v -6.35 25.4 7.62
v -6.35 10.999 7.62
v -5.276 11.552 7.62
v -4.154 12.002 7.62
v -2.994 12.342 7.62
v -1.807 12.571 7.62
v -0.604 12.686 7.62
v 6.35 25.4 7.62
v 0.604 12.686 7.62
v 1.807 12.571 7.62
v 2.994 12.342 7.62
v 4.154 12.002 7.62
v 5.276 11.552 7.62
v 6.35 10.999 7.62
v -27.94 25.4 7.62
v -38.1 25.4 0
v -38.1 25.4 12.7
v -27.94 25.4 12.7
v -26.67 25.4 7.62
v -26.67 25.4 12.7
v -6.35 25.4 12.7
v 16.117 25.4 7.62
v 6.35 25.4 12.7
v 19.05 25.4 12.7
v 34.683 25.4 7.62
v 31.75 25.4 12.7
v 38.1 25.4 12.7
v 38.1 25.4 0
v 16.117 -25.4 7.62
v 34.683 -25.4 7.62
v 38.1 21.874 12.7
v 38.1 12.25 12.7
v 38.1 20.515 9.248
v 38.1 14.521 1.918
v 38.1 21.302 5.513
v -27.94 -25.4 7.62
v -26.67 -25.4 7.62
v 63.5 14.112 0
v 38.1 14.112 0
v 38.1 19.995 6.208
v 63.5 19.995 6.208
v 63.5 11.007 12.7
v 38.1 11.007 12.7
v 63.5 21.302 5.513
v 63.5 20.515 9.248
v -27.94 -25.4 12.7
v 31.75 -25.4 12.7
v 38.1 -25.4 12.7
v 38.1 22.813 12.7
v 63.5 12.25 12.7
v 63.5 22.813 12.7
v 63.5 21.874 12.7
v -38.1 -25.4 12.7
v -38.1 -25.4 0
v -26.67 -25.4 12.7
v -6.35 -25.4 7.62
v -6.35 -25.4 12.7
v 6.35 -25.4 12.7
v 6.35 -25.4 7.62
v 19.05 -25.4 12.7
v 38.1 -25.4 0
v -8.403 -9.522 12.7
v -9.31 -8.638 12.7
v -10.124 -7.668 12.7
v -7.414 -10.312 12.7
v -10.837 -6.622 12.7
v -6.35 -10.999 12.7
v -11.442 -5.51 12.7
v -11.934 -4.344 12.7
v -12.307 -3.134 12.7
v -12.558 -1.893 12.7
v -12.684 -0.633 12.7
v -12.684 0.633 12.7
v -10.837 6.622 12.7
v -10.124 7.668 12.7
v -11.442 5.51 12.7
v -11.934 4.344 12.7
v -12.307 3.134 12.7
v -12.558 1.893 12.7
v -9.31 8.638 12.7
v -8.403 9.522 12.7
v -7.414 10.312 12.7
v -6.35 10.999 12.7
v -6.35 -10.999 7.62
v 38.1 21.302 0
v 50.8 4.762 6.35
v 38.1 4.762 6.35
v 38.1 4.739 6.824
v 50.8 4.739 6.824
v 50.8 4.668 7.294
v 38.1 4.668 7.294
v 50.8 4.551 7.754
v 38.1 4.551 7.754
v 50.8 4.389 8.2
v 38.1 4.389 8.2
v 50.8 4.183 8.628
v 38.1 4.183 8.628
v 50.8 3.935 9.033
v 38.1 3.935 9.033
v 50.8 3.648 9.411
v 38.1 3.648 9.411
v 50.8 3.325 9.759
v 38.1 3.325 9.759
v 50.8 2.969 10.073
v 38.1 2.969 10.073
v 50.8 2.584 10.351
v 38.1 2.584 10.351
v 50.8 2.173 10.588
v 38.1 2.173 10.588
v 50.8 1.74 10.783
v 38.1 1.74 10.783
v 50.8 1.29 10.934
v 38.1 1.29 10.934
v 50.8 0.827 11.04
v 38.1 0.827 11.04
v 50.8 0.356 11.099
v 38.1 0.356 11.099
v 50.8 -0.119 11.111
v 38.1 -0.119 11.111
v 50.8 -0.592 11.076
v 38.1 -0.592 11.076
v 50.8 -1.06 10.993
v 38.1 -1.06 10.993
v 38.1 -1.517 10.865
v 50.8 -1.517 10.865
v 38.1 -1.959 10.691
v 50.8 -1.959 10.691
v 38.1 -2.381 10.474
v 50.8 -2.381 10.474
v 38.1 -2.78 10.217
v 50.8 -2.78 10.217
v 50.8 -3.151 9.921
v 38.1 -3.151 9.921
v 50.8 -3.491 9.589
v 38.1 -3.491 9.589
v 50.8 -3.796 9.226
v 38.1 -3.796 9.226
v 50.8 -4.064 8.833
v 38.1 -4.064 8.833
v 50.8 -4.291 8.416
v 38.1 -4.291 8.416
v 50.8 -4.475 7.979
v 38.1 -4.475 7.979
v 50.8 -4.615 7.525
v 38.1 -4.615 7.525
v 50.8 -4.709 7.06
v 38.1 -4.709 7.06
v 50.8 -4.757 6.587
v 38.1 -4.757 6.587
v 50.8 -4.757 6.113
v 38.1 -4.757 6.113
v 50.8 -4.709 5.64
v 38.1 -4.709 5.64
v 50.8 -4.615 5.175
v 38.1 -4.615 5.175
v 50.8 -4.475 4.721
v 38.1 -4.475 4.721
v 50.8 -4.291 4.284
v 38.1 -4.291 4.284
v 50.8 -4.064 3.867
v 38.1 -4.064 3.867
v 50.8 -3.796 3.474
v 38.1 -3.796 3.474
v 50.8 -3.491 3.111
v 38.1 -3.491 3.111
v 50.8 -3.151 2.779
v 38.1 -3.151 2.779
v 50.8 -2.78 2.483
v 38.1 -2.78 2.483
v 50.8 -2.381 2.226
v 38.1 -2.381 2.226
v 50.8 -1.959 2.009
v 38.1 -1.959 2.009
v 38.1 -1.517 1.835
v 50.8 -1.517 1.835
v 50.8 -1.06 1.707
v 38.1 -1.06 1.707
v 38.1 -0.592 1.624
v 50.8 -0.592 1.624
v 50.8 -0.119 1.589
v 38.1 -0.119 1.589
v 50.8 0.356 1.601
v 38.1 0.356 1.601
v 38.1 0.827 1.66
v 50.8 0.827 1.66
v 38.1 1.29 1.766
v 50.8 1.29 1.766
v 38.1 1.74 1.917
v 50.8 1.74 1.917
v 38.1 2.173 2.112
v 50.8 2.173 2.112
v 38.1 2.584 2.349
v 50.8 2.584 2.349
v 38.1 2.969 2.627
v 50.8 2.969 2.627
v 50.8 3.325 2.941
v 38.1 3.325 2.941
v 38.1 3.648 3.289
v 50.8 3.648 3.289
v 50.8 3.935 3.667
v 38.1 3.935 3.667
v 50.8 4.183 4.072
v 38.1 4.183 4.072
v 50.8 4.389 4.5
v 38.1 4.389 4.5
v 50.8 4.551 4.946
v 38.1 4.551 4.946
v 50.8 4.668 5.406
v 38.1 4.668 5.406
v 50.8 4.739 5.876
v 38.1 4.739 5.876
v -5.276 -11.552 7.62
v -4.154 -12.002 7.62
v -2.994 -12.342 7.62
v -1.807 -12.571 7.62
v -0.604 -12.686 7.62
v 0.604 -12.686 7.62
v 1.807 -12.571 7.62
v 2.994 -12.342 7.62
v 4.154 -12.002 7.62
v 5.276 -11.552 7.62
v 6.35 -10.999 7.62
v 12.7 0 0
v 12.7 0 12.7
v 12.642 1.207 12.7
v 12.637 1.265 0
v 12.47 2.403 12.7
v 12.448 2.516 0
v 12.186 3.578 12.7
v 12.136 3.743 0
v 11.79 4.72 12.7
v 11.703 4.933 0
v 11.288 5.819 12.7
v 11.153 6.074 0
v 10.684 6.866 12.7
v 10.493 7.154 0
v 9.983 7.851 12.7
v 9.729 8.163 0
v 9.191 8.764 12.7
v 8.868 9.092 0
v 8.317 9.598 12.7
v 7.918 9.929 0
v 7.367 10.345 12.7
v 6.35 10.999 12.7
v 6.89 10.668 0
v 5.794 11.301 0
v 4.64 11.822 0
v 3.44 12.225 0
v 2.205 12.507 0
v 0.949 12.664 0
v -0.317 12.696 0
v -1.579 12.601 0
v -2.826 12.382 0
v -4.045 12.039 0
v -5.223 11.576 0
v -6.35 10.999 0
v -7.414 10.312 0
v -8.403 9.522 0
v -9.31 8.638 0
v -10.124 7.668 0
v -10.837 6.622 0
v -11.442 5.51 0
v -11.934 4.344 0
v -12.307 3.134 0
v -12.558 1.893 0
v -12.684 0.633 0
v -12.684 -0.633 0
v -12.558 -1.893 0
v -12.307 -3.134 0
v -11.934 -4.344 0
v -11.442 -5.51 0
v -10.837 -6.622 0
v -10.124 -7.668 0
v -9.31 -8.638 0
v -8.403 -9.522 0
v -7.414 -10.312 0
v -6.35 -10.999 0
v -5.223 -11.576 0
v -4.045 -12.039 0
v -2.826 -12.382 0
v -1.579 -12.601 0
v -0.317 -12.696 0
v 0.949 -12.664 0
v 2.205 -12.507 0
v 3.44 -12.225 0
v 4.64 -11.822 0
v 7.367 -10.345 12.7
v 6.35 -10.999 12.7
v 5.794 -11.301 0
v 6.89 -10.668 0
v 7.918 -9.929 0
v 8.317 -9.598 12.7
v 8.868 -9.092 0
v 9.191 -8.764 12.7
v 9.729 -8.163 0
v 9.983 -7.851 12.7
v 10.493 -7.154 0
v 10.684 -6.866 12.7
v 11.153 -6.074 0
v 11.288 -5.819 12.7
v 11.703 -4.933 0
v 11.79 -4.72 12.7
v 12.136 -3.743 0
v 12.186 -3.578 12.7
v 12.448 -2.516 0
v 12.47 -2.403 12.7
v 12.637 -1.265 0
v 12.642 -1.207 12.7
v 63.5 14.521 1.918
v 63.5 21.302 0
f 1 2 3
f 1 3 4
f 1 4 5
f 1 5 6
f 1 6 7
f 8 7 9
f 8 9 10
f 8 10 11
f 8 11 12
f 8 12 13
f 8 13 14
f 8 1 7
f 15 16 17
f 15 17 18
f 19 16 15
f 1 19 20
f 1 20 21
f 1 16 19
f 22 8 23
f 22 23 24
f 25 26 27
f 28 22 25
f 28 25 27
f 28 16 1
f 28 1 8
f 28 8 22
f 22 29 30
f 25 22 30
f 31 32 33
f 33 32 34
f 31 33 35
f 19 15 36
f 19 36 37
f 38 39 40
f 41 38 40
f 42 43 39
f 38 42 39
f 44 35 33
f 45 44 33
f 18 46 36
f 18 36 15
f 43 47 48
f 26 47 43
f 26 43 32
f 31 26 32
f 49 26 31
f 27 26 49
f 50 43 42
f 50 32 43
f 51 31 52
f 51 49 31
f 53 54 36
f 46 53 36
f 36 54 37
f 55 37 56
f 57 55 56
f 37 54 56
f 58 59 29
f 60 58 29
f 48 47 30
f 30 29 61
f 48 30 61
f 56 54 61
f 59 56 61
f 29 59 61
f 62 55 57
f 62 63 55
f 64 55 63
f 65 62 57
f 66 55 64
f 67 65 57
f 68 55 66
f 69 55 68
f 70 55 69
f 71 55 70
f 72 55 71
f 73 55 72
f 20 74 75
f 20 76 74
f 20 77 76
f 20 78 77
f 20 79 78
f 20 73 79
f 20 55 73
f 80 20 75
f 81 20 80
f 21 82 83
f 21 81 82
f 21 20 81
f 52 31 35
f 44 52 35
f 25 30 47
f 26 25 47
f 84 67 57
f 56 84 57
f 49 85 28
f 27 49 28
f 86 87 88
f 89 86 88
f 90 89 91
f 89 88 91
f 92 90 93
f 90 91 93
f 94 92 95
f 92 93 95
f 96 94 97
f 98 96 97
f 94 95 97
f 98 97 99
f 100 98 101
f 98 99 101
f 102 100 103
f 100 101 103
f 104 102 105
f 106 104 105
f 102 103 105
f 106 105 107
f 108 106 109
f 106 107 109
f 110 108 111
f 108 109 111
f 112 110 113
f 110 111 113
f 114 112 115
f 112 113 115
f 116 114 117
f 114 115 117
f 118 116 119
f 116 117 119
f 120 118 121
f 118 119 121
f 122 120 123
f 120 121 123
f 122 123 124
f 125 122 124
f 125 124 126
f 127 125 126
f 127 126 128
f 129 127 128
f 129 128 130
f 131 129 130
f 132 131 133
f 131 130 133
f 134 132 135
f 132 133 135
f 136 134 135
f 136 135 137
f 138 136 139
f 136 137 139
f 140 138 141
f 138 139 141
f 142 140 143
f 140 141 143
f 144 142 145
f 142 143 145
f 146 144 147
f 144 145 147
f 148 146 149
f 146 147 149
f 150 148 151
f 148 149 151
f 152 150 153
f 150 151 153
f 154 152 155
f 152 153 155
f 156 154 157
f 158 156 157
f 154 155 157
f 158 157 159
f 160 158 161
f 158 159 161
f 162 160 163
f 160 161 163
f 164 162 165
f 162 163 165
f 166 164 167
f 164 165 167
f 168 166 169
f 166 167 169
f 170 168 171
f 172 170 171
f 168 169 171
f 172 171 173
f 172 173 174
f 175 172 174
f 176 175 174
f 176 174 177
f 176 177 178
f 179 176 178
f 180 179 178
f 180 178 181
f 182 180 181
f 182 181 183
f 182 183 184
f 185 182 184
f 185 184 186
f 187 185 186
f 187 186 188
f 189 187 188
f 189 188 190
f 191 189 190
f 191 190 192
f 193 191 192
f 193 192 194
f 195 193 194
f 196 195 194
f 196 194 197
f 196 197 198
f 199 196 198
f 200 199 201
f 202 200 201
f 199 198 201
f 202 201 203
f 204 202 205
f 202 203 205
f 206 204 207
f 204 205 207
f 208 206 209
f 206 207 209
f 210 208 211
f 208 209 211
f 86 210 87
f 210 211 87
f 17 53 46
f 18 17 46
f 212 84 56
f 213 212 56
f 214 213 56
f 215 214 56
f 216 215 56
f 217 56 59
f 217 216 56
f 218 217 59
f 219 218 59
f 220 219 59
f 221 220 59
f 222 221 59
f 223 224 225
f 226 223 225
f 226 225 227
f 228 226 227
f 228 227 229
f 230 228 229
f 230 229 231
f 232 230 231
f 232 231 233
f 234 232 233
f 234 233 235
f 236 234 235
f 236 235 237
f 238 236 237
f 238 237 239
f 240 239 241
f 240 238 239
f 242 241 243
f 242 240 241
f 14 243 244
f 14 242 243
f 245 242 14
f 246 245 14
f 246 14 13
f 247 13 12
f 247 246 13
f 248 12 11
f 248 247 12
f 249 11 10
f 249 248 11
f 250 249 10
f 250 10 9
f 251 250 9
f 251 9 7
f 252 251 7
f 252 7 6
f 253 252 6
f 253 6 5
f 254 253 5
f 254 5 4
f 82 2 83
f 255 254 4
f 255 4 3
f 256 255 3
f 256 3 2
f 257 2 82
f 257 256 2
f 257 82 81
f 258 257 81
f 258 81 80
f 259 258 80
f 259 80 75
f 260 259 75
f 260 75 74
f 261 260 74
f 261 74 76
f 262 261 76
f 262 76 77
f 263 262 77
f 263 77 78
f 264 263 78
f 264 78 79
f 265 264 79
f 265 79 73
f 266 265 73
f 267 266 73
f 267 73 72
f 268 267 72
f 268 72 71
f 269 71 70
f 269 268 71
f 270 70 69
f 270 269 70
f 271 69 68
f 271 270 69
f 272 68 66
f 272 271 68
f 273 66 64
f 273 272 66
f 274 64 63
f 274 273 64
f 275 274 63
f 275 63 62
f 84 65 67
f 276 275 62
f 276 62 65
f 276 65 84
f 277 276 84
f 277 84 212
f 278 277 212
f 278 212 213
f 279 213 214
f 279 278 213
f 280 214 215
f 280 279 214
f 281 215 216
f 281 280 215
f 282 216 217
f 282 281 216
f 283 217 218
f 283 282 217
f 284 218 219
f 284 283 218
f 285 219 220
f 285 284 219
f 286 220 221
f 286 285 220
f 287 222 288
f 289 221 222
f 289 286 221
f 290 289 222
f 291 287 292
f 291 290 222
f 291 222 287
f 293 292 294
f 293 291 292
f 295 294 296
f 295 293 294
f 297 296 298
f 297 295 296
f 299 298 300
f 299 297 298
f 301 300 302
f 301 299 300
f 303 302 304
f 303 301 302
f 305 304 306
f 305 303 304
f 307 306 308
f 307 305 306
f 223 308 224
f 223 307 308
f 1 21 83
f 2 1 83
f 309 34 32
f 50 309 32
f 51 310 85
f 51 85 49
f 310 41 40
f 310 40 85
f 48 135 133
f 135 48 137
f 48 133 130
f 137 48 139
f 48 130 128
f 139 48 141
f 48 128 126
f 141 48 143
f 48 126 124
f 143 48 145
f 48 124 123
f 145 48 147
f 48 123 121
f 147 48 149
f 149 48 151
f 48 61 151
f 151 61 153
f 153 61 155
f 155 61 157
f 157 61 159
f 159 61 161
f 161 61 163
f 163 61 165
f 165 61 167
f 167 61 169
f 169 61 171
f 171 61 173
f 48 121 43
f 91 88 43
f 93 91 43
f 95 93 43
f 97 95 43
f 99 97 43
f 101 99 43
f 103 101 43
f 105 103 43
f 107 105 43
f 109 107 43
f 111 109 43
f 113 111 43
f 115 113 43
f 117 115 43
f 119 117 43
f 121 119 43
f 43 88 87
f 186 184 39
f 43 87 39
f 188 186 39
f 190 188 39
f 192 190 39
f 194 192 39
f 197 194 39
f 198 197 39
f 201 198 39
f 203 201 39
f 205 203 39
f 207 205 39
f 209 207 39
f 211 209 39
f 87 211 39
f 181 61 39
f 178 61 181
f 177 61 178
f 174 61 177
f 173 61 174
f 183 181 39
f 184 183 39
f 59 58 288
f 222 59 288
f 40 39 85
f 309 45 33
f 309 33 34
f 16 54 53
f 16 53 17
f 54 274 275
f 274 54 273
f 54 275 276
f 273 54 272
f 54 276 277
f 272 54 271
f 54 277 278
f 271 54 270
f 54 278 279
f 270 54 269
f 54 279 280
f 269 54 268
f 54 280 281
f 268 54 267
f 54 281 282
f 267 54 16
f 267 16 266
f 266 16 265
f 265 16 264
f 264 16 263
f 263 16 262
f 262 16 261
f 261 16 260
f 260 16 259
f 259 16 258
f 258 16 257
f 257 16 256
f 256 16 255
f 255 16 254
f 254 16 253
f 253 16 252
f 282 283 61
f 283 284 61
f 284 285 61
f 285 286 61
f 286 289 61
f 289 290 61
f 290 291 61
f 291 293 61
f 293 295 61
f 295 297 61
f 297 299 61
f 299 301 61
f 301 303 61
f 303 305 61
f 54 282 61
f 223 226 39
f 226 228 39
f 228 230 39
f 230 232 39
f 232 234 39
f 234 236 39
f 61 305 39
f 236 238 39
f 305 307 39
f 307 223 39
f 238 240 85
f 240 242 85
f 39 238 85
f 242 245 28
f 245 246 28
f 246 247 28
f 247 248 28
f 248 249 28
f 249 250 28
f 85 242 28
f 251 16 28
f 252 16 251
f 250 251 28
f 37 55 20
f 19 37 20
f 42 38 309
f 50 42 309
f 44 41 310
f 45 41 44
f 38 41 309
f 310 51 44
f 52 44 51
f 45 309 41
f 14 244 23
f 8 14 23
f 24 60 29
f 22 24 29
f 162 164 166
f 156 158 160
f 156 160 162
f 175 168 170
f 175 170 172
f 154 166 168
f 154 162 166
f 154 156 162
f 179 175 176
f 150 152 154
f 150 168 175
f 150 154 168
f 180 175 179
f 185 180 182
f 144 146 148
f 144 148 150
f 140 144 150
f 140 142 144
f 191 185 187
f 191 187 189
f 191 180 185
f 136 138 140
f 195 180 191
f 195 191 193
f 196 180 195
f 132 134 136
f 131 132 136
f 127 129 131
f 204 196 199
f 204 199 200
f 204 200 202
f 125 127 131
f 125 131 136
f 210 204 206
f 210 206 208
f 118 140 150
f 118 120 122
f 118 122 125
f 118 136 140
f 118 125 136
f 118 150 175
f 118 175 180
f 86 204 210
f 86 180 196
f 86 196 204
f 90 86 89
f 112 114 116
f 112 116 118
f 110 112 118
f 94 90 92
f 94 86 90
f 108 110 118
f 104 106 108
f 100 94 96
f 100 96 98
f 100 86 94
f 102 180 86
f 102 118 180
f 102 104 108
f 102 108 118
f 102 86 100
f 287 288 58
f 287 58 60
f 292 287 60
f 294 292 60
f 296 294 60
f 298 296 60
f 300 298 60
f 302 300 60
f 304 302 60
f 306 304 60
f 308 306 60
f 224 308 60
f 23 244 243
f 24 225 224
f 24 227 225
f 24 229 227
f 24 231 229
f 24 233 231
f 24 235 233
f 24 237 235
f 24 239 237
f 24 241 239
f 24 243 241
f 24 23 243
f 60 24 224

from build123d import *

# Parameters (mm, degrees)
F0_W     = 76.2
F0_H     = 50.8
F0_R     = 12.7
F1_DEPTH = 12.7
F2_W     = 1.27
F2_H     = 50.8
F3_DEPTH = 5.08
F5_DEPTH = 50.801
F6_R     = 4.7625
F7_DEPTH = 12.7
F9_DEPTH = 25.4


with BuildPart() as f1:
    # F0 (on Top) → F1 (new body)
    with BuildSketch(Plane.XY):
        Rectangle(F0_W, F0_H)
        Circle(F0_R, mode=Mode.SUBTRACT)
    extrude(amount=F1_DEPTH)

    # F2 (on face) → F3 (cut)
    with BuildSketch(Plane.XY.offset(12.7)):
        with Locations((-27.305, 0)):
            Rectangle(F2_W, F2_H)
        with BuildLine():
            Line((-6.35, -10.9985226281), (-6.35, -25.4))
            Line((-6.35, -25.4), (6.35, -25.4))
            Line((6.35, -25.4), (6.35, -10.9985226281))
            ThreePointArc((6.35, -10.9985226281), (0, -12.7), (-6.35, -10.9985226281))
        make_face()
        with BuildLine():
            Line((6.35, 25.4), (-6.35, 25.4))
            Line((-6.35, 25.4), (-6.35, 10.9985226281))
            ThreePointArc((-6.35, 10.9985226281), (0, 12.7), (6.35, 10.9985226281))
            Line((6.35, 10.9985226281), (6.35, 25.4))
        make_face()
    extrude(amount=-F3_DEPTH, mode=Mode.SUBTRACT)

    # F4 (on face) → F5 (cut, through all)
    with BuildSketch(Plane.XZ.offset(25.4)):
        Polygon((31.75, 12.7), (19.05, 12.7), (16.1170606325, 7.62), (34.6829393675, 7.62), align=None)
    extrude(amount=-F5_DEPTH, mode=Mode.SUBTRACT)

    # F6 (on face) → F7 (join)
    with BuildSketch(Plane.YZ.offset(38.1)):
        with Locations((0, 6.35)):
            Circle(F6_R)
    extrude(amount=F7_DEPTH)

    # F8 (on face) → F9 (join)
    with BuildSketch(Plane.YZ.offset(38.1)):
        Polygon((12.2501304301, 12.7), (11.0074644908, 12.7), (14.1120990738, 0), (19.9945662171, 6.2075415626), (21.301779896, 0), (22.8132493794, 12.7), (21.8736864626, 12.7), (21.301779896, 5.513084121), (20.5153317719, 9.2476758682), (14.5206041634, 1.9182431279), align=None)
    extrude(amount=F9_DEPTH)


solid = f1.part
